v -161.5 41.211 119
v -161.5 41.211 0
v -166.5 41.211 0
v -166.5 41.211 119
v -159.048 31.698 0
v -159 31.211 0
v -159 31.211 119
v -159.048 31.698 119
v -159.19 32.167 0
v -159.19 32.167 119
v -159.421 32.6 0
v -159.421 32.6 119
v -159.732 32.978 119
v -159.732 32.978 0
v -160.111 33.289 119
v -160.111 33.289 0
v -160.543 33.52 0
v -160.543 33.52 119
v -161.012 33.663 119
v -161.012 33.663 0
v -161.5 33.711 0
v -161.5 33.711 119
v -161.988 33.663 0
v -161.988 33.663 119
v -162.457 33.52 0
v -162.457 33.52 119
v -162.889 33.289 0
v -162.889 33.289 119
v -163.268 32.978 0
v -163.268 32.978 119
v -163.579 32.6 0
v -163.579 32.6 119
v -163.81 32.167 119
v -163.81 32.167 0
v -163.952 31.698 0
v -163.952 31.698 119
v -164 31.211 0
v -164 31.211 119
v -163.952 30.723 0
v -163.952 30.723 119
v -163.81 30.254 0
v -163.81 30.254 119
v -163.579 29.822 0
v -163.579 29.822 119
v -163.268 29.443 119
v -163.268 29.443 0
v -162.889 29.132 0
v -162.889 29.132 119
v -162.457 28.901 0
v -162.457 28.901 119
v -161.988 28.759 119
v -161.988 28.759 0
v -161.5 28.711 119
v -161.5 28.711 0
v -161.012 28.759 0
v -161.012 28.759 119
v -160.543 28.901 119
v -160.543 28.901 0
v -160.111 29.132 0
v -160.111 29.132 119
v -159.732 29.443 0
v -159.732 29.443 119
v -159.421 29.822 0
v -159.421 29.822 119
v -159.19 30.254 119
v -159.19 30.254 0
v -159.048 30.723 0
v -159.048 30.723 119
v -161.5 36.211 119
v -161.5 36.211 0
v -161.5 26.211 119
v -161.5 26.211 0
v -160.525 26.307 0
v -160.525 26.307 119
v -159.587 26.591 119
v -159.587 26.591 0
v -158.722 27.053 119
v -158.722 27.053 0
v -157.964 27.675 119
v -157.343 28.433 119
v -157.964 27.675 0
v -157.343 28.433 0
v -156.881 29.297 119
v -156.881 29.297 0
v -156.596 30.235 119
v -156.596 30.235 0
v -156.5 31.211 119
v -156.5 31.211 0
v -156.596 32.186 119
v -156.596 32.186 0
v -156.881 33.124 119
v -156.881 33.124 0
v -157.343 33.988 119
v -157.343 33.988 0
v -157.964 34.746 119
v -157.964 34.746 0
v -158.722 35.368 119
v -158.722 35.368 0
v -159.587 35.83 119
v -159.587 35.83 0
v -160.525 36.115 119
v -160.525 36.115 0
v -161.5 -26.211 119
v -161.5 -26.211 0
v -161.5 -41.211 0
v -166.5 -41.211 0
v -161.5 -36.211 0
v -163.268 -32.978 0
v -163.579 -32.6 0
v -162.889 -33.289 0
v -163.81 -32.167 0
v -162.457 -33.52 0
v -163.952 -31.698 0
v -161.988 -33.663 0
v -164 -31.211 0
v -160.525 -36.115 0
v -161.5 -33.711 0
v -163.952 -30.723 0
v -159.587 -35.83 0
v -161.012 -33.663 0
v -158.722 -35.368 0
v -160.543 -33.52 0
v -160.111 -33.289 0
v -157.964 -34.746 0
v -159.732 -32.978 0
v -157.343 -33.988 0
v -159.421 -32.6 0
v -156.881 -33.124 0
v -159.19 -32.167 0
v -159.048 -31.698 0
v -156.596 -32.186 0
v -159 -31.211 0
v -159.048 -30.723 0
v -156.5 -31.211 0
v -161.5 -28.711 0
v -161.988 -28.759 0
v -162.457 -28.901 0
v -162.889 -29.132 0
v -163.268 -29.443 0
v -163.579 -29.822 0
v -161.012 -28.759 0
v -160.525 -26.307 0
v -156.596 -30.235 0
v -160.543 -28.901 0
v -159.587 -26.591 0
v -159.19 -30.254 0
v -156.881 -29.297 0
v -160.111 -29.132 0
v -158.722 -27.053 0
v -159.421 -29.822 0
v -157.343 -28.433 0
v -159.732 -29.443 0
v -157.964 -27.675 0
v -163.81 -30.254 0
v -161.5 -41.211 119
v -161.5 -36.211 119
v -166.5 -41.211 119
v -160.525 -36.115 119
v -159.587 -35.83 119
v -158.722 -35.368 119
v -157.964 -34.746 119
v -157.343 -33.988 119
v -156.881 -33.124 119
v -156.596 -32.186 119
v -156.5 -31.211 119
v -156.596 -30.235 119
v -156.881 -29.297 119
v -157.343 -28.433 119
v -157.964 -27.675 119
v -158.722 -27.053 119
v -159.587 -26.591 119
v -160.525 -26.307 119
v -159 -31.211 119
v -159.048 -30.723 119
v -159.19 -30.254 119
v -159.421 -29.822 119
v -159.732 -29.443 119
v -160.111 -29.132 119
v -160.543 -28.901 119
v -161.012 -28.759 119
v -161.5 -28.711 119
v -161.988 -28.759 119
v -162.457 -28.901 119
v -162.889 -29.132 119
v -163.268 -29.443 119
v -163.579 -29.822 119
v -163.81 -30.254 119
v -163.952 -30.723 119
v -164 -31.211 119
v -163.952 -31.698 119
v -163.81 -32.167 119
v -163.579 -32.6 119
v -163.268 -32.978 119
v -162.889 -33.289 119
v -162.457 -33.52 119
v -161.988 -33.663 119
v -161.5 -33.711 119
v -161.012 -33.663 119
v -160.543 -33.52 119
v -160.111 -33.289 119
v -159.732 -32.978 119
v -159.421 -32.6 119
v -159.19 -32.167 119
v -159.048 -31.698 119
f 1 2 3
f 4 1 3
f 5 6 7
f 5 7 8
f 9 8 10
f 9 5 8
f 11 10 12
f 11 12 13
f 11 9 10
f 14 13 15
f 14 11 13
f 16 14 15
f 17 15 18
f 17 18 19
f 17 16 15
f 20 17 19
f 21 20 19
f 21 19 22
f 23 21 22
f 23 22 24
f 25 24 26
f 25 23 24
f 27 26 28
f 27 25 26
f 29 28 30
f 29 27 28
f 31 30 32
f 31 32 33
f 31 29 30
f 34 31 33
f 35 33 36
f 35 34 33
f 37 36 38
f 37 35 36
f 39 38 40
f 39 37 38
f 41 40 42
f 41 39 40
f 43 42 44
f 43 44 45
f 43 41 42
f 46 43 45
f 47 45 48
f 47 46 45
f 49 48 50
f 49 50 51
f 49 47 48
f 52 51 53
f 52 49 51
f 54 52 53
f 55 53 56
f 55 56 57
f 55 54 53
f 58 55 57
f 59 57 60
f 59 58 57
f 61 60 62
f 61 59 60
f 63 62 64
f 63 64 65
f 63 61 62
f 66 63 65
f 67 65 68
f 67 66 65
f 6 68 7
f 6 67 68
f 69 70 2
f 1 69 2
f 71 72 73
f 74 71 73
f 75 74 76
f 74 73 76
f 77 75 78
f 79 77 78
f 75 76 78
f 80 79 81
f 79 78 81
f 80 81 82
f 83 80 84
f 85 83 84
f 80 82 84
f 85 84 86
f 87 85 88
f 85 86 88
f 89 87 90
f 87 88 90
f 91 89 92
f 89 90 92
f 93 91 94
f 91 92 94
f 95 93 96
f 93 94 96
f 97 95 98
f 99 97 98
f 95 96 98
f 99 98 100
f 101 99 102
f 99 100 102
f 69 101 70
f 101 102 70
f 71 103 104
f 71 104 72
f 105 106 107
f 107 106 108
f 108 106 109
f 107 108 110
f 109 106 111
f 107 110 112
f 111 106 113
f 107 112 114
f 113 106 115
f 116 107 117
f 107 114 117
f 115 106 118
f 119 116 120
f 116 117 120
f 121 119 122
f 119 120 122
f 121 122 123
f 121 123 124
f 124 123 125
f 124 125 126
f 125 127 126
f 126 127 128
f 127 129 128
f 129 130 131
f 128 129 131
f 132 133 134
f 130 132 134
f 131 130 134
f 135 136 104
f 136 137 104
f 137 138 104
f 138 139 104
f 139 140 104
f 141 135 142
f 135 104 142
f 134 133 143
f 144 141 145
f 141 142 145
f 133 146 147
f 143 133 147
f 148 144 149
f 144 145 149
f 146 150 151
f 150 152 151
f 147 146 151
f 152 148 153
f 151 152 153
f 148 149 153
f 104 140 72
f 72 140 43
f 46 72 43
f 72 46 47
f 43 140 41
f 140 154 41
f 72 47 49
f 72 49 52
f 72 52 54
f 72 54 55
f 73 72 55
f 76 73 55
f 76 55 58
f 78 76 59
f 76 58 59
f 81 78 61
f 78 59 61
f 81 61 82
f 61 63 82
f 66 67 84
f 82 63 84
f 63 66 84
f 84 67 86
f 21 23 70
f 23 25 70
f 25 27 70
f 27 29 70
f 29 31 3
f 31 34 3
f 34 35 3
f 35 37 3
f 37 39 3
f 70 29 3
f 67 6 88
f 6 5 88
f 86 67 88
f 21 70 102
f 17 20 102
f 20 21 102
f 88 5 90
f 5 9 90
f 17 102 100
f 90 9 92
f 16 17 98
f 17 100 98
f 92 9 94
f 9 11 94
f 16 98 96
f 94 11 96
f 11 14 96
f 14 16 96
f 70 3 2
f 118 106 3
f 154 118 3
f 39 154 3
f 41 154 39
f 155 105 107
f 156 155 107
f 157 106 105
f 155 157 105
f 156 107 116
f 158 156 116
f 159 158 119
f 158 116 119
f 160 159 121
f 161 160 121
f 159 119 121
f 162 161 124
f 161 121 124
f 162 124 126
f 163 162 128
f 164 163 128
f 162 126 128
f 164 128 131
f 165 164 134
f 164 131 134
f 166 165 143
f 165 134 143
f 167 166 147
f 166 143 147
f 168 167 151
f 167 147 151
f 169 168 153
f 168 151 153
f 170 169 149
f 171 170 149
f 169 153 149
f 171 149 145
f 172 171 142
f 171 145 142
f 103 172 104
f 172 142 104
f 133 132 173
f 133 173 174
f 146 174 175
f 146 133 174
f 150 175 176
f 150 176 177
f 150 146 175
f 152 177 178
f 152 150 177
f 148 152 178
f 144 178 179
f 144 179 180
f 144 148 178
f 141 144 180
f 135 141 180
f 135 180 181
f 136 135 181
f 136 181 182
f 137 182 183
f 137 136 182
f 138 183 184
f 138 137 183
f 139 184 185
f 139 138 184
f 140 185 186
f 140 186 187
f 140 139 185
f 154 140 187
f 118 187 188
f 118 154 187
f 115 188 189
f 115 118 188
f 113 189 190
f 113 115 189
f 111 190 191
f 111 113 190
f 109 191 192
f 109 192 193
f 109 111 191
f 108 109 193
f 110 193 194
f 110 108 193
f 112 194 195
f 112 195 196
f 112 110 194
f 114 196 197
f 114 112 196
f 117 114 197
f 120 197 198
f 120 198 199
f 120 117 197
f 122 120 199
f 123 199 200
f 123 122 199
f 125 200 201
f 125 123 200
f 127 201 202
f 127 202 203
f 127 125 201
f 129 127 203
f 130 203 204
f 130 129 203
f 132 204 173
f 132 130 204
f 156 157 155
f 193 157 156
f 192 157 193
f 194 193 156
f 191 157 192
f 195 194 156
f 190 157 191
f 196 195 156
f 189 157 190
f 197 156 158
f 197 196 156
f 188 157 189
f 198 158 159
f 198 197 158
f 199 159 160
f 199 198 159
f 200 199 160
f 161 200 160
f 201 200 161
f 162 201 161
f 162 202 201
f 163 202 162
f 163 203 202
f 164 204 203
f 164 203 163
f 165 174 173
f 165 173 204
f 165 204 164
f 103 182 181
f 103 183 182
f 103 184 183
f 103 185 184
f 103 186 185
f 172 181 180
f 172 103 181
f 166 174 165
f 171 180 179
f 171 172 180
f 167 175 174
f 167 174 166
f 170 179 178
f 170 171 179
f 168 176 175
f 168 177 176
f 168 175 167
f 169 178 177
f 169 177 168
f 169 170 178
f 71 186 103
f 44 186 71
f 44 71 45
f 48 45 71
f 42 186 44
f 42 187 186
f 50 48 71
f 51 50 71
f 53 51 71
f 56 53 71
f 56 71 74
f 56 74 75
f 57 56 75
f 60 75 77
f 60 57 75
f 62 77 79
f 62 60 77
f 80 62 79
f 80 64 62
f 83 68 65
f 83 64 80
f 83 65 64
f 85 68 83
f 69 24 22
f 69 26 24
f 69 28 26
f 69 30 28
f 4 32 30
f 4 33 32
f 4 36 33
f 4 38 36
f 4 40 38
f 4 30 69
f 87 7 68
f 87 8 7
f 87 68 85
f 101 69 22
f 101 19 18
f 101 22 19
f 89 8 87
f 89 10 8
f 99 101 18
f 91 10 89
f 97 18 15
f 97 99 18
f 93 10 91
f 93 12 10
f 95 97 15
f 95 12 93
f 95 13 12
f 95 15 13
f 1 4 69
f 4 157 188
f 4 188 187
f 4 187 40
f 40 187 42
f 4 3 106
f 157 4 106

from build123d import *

# Parameters (mm, degrees)
SKETCH_1_R      = 2.5
EXTRUDE_1_DEPTH = 119


with BuildPart() as part:
    # 草图1 → 凸台-拉伸1 (new body)
    with BuildSketch(Plane.XY):
        with BuildLine():
            Line((-166.5, 31.210634294), (-166.5, -31.210634294))
            Line((-166.5, -31.210634294), (-166.5, -36.210634294))
            Line((-166.5, -36.210634294), (-166.5, -41.210634294))
            Line((-166.5, -41.210634294), (-161.5, -41.210634294))
            Line((-161.5, -41.210634294), (-161.5, -36.210634294))
            ThreePointArc((-161.5, -36.210634294), (-156.5, -31.210634294), (-161.5, -26.210634294))
            Line((-161.5, -26.210634294), (-161.5, 26.210634294))
            ThreePointArc((-161.5, 26.210634294), (-156.5, 31.210634294), (-161.5, 36.210634294))
            Line((-161.5, 36.210634294), (-161.5, 41.210634294))
            Line((-161.5, 41.210634294), (-166.5, 41.210634294))
            Line((-166.5, 41.210634294), (-166.5, 36.210634294))
            Line((-166.5, 36.210634294), (-166.5, 31.210634294))
        make_face()
        with Locations((-161.5, 31.210634294)):
            Circle(SKETCH_1_R, mode=Mode.SUBTRACT)
        with Locations((-161.5, -31.210634294)):
            Circle(SKETCH_1_R, mode=Mode.SUBTRACT)
    extrude(amount=EXTRUDE_1_DEPTH)


solid = part.part
